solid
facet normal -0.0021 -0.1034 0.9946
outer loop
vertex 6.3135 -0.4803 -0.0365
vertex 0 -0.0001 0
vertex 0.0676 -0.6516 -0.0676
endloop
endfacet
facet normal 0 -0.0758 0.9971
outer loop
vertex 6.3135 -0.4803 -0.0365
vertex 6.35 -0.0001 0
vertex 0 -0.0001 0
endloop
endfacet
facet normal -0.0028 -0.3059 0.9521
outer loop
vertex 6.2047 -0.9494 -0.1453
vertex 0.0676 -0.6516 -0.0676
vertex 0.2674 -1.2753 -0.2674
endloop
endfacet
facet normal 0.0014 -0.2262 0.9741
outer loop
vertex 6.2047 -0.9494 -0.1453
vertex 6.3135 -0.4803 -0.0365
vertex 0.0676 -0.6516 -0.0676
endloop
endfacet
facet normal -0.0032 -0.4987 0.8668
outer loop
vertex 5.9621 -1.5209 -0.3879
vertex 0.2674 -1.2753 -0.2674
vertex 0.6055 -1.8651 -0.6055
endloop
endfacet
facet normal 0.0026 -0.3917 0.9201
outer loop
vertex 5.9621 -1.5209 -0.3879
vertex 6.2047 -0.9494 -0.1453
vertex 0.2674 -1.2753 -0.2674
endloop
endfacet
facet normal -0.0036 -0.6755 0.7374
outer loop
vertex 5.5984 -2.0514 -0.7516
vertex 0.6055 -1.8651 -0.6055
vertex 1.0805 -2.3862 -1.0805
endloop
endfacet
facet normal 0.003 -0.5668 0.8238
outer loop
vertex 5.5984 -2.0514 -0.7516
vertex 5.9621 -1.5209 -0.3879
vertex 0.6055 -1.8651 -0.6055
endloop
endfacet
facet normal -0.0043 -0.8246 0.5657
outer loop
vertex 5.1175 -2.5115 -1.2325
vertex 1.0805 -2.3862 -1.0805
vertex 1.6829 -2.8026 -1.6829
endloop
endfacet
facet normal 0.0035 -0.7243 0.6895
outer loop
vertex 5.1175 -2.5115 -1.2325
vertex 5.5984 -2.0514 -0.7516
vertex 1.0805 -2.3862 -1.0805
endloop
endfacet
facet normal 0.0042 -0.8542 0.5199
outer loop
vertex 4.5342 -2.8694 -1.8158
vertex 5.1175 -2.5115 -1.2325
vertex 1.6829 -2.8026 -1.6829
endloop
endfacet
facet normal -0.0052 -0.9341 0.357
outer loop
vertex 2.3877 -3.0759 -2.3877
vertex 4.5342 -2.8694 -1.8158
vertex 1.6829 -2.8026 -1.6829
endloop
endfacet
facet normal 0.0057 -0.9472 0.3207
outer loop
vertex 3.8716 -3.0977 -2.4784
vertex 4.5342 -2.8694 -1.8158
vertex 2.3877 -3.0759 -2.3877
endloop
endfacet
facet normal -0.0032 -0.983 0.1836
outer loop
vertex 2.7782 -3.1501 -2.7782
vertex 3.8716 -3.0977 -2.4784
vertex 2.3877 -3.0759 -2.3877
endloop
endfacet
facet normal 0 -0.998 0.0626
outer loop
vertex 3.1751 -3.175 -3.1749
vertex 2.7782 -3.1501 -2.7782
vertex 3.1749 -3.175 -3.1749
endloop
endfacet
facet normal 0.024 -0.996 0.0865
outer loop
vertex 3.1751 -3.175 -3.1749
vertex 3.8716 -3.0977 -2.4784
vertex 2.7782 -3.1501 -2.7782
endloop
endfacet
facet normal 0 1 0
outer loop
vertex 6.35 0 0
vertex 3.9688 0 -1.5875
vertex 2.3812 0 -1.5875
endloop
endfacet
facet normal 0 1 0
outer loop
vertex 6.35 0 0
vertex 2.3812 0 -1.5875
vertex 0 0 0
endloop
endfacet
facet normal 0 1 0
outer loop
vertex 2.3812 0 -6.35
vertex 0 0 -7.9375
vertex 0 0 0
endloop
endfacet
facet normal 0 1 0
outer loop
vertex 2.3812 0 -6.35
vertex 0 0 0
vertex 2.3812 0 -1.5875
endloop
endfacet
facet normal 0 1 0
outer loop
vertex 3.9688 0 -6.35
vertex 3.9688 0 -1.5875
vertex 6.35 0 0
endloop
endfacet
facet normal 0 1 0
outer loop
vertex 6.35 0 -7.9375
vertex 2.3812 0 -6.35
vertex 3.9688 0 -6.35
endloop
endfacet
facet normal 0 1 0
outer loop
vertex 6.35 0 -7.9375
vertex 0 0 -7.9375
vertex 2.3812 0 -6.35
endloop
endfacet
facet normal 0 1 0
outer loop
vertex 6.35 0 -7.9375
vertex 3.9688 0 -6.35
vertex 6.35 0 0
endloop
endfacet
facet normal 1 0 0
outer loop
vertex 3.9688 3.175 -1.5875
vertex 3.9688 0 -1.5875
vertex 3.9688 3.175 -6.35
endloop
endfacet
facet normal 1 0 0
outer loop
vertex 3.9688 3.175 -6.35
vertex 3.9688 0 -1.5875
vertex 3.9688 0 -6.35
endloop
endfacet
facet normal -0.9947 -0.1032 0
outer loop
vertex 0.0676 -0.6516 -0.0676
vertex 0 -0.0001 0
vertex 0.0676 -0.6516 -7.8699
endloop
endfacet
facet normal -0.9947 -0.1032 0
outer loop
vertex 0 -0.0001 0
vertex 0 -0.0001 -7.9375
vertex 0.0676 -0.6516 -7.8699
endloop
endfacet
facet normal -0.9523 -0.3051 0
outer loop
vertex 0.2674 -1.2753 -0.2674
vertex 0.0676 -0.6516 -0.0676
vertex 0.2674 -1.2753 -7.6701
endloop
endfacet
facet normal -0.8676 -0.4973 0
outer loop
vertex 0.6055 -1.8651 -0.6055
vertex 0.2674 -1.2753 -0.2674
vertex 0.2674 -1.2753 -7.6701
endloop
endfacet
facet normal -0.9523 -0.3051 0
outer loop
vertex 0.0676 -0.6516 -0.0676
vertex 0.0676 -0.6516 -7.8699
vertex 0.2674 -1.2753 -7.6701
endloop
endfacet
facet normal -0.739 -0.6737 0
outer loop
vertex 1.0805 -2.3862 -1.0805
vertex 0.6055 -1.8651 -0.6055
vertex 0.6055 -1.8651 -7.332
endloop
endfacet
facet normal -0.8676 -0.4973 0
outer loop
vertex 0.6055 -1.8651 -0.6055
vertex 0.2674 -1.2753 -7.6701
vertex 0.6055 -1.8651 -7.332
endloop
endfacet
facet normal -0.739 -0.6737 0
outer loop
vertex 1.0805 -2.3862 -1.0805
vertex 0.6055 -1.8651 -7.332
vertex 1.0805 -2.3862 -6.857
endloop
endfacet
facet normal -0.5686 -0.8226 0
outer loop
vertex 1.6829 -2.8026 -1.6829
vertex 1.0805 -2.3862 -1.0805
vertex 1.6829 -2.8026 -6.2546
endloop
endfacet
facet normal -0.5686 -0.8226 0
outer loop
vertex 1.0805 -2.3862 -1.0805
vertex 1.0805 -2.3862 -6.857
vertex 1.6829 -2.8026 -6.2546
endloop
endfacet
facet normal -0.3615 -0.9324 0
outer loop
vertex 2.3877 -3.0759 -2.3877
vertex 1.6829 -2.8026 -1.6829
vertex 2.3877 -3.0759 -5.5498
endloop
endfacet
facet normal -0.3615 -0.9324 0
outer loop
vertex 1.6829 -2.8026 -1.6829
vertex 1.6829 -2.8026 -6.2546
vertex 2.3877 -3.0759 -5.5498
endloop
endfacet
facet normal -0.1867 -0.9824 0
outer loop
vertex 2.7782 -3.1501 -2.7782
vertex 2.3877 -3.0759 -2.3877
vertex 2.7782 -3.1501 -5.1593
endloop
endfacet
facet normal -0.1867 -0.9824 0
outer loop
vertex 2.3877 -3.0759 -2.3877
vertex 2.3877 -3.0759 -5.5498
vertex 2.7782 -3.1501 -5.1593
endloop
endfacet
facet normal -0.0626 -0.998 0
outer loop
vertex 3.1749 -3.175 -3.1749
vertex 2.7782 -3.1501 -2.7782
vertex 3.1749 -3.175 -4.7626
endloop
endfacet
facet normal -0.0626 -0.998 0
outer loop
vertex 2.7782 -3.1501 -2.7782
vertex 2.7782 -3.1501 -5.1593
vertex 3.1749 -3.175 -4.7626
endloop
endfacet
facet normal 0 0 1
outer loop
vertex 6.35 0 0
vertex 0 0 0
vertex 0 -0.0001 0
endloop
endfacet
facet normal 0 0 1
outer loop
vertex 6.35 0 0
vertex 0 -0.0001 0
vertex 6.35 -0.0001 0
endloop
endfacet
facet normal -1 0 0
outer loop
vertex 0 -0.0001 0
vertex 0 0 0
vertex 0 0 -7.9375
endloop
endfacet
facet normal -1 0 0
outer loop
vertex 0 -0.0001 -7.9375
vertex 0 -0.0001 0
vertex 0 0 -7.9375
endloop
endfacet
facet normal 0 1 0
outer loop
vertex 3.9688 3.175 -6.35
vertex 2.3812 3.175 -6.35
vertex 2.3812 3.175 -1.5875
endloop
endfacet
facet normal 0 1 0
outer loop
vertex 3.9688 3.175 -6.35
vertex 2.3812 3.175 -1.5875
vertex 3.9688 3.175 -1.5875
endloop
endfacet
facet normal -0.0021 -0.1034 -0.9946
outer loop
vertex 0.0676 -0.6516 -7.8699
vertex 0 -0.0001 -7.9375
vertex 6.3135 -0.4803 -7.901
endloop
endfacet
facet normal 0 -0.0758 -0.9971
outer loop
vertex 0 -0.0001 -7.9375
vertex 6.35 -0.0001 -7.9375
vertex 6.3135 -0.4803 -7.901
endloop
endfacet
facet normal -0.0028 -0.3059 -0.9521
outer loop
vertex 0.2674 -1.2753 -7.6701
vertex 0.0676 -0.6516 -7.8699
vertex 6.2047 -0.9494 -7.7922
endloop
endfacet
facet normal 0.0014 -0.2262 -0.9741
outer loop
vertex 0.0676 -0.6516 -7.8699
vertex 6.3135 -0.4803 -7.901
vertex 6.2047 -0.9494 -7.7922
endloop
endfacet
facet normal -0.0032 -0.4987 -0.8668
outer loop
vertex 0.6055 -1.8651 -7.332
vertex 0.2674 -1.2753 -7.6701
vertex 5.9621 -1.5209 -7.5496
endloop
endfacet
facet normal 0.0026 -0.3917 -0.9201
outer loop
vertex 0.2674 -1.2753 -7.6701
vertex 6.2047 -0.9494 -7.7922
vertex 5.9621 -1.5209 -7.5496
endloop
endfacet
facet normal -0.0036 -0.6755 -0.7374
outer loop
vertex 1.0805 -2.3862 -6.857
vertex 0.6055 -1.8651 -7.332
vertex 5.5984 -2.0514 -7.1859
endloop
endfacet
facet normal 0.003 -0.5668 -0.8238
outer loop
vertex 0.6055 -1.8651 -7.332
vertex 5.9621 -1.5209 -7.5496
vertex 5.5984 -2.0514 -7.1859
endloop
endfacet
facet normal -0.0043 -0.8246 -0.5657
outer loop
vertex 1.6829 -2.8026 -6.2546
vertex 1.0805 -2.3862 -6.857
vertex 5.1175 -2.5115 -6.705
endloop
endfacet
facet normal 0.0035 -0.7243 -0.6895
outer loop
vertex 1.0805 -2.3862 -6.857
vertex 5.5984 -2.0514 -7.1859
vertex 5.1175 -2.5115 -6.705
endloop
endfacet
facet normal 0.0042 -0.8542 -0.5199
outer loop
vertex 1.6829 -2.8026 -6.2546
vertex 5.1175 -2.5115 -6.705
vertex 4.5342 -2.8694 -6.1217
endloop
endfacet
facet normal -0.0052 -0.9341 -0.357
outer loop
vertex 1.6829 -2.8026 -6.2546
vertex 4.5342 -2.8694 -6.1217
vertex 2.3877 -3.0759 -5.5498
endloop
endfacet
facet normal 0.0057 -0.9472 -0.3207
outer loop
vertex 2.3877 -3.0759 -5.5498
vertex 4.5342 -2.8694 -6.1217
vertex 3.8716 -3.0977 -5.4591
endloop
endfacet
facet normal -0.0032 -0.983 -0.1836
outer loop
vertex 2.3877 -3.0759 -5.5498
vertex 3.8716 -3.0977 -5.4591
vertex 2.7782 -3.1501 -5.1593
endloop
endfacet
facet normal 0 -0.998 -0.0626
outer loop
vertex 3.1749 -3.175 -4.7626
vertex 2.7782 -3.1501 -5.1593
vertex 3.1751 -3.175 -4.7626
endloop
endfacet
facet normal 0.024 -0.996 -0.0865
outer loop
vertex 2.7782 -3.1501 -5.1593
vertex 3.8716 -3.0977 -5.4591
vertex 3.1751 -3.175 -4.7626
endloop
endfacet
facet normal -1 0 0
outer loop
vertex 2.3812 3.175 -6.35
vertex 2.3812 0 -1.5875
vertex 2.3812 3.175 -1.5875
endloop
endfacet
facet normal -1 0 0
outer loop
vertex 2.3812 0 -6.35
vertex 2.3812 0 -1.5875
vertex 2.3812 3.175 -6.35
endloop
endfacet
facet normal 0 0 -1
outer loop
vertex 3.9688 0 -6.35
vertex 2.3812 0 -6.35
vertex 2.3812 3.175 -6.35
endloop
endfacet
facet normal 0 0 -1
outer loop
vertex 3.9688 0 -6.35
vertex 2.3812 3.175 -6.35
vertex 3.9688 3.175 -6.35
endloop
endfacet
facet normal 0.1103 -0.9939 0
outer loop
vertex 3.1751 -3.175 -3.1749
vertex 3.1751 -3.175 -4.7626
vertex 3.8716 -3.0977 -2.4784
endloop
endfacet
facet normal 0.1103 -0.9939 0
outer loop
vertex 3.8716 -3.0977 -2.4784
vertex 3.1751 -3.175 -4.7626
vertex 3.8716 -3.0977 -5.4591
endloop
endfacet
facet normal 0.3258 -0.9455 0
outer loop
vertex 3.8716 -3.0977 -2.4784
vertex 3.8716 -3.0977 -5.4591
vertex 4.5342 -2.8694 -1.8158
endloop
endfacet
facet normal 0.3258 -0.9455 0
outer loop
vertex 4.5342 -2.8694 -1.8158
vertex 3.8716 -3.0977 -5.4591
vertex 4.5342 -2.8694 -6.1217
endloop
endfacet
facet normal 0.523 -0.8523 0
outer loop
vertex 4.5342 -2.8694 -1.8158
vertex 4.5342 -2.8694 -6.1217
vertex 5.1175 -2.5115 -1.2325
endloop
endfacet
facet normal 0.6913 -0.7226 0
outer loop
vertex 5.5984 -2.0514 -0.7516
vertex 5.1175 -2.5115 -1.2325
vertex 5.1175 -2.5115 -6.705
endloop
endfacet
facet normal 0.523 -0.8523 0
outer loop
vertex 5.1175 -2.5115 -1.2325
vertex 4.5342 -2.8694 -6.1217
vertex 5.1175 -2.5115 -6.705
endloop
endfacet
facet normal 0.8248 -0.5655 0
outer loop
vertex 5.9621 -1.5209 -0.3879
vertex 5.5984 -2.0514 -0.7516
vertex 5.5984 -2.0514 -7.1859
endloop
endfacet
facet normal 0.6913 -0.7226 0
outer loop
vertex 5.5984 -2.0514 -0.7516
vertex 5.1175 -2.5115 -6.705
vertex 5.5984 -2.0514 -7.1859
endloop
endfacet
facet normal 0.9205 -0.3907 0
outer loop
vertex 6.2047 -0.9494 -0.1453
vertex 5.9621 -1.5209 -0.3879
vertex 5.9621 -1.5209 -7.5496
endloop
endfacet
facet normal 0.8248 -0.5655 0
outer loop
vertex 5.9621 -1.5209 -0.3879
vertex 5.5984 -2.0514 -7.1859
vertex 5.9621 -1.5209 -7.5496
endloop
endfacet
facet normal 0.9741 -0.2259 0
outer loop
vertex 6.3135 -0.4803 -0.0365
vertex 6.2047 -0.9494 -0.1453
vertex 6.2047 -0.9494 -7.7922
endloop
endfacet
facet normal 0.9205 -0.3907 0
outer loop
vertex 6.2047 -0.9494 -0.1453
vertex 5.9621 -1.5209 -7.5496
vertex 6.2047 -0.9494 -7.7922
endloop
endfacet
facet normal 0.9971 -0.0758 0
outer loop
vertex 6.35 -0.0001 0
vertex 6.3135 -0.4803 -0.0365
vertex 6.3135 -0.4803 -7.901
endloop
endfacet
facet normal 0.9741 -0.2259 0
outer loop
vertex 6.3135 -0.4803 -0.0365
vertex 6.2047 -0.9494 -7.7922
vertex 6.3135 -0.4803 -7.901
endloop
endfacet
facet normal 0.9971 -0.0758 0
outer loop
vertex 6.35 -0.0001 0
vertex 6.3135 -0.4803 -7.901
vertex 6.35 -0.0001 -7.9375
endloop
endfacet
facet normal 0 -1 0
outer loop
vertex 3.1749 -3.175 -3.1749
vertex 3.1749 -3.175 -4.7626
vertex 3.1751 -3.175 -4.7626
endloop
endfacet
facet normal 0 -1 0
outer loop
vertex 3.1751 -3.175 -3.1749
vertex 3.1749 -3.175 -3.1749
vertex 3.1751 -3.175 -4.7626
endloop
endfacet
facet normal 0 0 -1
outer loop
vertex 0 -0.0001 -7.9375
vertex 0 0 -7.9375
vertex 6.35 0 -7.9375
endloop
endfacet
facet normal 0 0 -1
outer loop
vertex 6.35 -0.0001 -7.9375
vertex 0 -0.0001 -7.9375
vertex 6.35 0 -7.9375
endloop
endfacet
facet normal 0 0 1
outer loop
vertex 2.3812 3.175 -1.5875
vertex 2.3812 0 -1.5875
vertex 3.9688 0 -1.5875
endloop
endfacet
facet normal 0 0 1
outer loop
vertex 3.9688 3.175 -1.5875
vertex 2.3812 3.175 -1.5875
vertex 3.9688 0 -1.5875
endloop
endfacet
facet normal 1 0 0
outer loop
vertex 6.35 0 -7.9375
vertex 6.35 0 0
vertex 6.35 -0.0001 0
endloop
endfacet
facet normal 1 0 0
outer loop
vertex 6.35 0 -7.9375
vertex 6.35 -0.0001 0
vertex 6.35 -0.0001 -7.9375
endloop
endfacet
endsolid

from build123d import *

# Parameters (mm, degrees)
SKETCH1_W           = 6.35
SKETCH1_H           = 7.9375
BOSS_EXTRUDE1_DEPTH = 3.175
SKETCH1_3_W         = 1.5875
SKETCH1_3_H         = 4.7625
BOSS_EXTRUDE2_DEPTH = 3.175
FILLET1_R           = 3.175


with BuildPart() as part:
    # Sketch1 → Boss-Extrude1 (new body)
    with BuildSketch(Plane(origin=(0, 0, 0), x_dir=(1, 0, 0), z_dir=(0, 1, 0))):
        with Locations((3.175, 3.96875)):
            Rectangle(SKETCH1_W, SKETCH1_H)
    extrude(amount=-BOSS_EXTRUDE1_DEPTH)

    # Sketch1<3> → Boss-Extrude2 (add)
    with BuildSketch(Plane(origin=(0, 0, 0), x_dir=(1, 0, 0), z_dir=(0, 1, 0))):
        with Locations((3.175, 3.96875)):
            Rectangle(SKETCH1_3_W, SKETCH1_3_H)
    extrude(amount=BOSS_EXTRUDE2_DEPTH)

    # Fillet1
    fillet1_edges = [part.edges().sort_by_distance(p)[0] for p in [
        (6.35, -3.175, -3.96875),
        (3.175, -3.175, -7.9375),
        (0, -3.175, -3.96875),
        (3.175, -3.175, 0),
    ]]
    fillet(fillet1_edges, radius=FILLET1_R - 0.0001)  # a hair under: the kernel refuses the full size


solid = part.part
